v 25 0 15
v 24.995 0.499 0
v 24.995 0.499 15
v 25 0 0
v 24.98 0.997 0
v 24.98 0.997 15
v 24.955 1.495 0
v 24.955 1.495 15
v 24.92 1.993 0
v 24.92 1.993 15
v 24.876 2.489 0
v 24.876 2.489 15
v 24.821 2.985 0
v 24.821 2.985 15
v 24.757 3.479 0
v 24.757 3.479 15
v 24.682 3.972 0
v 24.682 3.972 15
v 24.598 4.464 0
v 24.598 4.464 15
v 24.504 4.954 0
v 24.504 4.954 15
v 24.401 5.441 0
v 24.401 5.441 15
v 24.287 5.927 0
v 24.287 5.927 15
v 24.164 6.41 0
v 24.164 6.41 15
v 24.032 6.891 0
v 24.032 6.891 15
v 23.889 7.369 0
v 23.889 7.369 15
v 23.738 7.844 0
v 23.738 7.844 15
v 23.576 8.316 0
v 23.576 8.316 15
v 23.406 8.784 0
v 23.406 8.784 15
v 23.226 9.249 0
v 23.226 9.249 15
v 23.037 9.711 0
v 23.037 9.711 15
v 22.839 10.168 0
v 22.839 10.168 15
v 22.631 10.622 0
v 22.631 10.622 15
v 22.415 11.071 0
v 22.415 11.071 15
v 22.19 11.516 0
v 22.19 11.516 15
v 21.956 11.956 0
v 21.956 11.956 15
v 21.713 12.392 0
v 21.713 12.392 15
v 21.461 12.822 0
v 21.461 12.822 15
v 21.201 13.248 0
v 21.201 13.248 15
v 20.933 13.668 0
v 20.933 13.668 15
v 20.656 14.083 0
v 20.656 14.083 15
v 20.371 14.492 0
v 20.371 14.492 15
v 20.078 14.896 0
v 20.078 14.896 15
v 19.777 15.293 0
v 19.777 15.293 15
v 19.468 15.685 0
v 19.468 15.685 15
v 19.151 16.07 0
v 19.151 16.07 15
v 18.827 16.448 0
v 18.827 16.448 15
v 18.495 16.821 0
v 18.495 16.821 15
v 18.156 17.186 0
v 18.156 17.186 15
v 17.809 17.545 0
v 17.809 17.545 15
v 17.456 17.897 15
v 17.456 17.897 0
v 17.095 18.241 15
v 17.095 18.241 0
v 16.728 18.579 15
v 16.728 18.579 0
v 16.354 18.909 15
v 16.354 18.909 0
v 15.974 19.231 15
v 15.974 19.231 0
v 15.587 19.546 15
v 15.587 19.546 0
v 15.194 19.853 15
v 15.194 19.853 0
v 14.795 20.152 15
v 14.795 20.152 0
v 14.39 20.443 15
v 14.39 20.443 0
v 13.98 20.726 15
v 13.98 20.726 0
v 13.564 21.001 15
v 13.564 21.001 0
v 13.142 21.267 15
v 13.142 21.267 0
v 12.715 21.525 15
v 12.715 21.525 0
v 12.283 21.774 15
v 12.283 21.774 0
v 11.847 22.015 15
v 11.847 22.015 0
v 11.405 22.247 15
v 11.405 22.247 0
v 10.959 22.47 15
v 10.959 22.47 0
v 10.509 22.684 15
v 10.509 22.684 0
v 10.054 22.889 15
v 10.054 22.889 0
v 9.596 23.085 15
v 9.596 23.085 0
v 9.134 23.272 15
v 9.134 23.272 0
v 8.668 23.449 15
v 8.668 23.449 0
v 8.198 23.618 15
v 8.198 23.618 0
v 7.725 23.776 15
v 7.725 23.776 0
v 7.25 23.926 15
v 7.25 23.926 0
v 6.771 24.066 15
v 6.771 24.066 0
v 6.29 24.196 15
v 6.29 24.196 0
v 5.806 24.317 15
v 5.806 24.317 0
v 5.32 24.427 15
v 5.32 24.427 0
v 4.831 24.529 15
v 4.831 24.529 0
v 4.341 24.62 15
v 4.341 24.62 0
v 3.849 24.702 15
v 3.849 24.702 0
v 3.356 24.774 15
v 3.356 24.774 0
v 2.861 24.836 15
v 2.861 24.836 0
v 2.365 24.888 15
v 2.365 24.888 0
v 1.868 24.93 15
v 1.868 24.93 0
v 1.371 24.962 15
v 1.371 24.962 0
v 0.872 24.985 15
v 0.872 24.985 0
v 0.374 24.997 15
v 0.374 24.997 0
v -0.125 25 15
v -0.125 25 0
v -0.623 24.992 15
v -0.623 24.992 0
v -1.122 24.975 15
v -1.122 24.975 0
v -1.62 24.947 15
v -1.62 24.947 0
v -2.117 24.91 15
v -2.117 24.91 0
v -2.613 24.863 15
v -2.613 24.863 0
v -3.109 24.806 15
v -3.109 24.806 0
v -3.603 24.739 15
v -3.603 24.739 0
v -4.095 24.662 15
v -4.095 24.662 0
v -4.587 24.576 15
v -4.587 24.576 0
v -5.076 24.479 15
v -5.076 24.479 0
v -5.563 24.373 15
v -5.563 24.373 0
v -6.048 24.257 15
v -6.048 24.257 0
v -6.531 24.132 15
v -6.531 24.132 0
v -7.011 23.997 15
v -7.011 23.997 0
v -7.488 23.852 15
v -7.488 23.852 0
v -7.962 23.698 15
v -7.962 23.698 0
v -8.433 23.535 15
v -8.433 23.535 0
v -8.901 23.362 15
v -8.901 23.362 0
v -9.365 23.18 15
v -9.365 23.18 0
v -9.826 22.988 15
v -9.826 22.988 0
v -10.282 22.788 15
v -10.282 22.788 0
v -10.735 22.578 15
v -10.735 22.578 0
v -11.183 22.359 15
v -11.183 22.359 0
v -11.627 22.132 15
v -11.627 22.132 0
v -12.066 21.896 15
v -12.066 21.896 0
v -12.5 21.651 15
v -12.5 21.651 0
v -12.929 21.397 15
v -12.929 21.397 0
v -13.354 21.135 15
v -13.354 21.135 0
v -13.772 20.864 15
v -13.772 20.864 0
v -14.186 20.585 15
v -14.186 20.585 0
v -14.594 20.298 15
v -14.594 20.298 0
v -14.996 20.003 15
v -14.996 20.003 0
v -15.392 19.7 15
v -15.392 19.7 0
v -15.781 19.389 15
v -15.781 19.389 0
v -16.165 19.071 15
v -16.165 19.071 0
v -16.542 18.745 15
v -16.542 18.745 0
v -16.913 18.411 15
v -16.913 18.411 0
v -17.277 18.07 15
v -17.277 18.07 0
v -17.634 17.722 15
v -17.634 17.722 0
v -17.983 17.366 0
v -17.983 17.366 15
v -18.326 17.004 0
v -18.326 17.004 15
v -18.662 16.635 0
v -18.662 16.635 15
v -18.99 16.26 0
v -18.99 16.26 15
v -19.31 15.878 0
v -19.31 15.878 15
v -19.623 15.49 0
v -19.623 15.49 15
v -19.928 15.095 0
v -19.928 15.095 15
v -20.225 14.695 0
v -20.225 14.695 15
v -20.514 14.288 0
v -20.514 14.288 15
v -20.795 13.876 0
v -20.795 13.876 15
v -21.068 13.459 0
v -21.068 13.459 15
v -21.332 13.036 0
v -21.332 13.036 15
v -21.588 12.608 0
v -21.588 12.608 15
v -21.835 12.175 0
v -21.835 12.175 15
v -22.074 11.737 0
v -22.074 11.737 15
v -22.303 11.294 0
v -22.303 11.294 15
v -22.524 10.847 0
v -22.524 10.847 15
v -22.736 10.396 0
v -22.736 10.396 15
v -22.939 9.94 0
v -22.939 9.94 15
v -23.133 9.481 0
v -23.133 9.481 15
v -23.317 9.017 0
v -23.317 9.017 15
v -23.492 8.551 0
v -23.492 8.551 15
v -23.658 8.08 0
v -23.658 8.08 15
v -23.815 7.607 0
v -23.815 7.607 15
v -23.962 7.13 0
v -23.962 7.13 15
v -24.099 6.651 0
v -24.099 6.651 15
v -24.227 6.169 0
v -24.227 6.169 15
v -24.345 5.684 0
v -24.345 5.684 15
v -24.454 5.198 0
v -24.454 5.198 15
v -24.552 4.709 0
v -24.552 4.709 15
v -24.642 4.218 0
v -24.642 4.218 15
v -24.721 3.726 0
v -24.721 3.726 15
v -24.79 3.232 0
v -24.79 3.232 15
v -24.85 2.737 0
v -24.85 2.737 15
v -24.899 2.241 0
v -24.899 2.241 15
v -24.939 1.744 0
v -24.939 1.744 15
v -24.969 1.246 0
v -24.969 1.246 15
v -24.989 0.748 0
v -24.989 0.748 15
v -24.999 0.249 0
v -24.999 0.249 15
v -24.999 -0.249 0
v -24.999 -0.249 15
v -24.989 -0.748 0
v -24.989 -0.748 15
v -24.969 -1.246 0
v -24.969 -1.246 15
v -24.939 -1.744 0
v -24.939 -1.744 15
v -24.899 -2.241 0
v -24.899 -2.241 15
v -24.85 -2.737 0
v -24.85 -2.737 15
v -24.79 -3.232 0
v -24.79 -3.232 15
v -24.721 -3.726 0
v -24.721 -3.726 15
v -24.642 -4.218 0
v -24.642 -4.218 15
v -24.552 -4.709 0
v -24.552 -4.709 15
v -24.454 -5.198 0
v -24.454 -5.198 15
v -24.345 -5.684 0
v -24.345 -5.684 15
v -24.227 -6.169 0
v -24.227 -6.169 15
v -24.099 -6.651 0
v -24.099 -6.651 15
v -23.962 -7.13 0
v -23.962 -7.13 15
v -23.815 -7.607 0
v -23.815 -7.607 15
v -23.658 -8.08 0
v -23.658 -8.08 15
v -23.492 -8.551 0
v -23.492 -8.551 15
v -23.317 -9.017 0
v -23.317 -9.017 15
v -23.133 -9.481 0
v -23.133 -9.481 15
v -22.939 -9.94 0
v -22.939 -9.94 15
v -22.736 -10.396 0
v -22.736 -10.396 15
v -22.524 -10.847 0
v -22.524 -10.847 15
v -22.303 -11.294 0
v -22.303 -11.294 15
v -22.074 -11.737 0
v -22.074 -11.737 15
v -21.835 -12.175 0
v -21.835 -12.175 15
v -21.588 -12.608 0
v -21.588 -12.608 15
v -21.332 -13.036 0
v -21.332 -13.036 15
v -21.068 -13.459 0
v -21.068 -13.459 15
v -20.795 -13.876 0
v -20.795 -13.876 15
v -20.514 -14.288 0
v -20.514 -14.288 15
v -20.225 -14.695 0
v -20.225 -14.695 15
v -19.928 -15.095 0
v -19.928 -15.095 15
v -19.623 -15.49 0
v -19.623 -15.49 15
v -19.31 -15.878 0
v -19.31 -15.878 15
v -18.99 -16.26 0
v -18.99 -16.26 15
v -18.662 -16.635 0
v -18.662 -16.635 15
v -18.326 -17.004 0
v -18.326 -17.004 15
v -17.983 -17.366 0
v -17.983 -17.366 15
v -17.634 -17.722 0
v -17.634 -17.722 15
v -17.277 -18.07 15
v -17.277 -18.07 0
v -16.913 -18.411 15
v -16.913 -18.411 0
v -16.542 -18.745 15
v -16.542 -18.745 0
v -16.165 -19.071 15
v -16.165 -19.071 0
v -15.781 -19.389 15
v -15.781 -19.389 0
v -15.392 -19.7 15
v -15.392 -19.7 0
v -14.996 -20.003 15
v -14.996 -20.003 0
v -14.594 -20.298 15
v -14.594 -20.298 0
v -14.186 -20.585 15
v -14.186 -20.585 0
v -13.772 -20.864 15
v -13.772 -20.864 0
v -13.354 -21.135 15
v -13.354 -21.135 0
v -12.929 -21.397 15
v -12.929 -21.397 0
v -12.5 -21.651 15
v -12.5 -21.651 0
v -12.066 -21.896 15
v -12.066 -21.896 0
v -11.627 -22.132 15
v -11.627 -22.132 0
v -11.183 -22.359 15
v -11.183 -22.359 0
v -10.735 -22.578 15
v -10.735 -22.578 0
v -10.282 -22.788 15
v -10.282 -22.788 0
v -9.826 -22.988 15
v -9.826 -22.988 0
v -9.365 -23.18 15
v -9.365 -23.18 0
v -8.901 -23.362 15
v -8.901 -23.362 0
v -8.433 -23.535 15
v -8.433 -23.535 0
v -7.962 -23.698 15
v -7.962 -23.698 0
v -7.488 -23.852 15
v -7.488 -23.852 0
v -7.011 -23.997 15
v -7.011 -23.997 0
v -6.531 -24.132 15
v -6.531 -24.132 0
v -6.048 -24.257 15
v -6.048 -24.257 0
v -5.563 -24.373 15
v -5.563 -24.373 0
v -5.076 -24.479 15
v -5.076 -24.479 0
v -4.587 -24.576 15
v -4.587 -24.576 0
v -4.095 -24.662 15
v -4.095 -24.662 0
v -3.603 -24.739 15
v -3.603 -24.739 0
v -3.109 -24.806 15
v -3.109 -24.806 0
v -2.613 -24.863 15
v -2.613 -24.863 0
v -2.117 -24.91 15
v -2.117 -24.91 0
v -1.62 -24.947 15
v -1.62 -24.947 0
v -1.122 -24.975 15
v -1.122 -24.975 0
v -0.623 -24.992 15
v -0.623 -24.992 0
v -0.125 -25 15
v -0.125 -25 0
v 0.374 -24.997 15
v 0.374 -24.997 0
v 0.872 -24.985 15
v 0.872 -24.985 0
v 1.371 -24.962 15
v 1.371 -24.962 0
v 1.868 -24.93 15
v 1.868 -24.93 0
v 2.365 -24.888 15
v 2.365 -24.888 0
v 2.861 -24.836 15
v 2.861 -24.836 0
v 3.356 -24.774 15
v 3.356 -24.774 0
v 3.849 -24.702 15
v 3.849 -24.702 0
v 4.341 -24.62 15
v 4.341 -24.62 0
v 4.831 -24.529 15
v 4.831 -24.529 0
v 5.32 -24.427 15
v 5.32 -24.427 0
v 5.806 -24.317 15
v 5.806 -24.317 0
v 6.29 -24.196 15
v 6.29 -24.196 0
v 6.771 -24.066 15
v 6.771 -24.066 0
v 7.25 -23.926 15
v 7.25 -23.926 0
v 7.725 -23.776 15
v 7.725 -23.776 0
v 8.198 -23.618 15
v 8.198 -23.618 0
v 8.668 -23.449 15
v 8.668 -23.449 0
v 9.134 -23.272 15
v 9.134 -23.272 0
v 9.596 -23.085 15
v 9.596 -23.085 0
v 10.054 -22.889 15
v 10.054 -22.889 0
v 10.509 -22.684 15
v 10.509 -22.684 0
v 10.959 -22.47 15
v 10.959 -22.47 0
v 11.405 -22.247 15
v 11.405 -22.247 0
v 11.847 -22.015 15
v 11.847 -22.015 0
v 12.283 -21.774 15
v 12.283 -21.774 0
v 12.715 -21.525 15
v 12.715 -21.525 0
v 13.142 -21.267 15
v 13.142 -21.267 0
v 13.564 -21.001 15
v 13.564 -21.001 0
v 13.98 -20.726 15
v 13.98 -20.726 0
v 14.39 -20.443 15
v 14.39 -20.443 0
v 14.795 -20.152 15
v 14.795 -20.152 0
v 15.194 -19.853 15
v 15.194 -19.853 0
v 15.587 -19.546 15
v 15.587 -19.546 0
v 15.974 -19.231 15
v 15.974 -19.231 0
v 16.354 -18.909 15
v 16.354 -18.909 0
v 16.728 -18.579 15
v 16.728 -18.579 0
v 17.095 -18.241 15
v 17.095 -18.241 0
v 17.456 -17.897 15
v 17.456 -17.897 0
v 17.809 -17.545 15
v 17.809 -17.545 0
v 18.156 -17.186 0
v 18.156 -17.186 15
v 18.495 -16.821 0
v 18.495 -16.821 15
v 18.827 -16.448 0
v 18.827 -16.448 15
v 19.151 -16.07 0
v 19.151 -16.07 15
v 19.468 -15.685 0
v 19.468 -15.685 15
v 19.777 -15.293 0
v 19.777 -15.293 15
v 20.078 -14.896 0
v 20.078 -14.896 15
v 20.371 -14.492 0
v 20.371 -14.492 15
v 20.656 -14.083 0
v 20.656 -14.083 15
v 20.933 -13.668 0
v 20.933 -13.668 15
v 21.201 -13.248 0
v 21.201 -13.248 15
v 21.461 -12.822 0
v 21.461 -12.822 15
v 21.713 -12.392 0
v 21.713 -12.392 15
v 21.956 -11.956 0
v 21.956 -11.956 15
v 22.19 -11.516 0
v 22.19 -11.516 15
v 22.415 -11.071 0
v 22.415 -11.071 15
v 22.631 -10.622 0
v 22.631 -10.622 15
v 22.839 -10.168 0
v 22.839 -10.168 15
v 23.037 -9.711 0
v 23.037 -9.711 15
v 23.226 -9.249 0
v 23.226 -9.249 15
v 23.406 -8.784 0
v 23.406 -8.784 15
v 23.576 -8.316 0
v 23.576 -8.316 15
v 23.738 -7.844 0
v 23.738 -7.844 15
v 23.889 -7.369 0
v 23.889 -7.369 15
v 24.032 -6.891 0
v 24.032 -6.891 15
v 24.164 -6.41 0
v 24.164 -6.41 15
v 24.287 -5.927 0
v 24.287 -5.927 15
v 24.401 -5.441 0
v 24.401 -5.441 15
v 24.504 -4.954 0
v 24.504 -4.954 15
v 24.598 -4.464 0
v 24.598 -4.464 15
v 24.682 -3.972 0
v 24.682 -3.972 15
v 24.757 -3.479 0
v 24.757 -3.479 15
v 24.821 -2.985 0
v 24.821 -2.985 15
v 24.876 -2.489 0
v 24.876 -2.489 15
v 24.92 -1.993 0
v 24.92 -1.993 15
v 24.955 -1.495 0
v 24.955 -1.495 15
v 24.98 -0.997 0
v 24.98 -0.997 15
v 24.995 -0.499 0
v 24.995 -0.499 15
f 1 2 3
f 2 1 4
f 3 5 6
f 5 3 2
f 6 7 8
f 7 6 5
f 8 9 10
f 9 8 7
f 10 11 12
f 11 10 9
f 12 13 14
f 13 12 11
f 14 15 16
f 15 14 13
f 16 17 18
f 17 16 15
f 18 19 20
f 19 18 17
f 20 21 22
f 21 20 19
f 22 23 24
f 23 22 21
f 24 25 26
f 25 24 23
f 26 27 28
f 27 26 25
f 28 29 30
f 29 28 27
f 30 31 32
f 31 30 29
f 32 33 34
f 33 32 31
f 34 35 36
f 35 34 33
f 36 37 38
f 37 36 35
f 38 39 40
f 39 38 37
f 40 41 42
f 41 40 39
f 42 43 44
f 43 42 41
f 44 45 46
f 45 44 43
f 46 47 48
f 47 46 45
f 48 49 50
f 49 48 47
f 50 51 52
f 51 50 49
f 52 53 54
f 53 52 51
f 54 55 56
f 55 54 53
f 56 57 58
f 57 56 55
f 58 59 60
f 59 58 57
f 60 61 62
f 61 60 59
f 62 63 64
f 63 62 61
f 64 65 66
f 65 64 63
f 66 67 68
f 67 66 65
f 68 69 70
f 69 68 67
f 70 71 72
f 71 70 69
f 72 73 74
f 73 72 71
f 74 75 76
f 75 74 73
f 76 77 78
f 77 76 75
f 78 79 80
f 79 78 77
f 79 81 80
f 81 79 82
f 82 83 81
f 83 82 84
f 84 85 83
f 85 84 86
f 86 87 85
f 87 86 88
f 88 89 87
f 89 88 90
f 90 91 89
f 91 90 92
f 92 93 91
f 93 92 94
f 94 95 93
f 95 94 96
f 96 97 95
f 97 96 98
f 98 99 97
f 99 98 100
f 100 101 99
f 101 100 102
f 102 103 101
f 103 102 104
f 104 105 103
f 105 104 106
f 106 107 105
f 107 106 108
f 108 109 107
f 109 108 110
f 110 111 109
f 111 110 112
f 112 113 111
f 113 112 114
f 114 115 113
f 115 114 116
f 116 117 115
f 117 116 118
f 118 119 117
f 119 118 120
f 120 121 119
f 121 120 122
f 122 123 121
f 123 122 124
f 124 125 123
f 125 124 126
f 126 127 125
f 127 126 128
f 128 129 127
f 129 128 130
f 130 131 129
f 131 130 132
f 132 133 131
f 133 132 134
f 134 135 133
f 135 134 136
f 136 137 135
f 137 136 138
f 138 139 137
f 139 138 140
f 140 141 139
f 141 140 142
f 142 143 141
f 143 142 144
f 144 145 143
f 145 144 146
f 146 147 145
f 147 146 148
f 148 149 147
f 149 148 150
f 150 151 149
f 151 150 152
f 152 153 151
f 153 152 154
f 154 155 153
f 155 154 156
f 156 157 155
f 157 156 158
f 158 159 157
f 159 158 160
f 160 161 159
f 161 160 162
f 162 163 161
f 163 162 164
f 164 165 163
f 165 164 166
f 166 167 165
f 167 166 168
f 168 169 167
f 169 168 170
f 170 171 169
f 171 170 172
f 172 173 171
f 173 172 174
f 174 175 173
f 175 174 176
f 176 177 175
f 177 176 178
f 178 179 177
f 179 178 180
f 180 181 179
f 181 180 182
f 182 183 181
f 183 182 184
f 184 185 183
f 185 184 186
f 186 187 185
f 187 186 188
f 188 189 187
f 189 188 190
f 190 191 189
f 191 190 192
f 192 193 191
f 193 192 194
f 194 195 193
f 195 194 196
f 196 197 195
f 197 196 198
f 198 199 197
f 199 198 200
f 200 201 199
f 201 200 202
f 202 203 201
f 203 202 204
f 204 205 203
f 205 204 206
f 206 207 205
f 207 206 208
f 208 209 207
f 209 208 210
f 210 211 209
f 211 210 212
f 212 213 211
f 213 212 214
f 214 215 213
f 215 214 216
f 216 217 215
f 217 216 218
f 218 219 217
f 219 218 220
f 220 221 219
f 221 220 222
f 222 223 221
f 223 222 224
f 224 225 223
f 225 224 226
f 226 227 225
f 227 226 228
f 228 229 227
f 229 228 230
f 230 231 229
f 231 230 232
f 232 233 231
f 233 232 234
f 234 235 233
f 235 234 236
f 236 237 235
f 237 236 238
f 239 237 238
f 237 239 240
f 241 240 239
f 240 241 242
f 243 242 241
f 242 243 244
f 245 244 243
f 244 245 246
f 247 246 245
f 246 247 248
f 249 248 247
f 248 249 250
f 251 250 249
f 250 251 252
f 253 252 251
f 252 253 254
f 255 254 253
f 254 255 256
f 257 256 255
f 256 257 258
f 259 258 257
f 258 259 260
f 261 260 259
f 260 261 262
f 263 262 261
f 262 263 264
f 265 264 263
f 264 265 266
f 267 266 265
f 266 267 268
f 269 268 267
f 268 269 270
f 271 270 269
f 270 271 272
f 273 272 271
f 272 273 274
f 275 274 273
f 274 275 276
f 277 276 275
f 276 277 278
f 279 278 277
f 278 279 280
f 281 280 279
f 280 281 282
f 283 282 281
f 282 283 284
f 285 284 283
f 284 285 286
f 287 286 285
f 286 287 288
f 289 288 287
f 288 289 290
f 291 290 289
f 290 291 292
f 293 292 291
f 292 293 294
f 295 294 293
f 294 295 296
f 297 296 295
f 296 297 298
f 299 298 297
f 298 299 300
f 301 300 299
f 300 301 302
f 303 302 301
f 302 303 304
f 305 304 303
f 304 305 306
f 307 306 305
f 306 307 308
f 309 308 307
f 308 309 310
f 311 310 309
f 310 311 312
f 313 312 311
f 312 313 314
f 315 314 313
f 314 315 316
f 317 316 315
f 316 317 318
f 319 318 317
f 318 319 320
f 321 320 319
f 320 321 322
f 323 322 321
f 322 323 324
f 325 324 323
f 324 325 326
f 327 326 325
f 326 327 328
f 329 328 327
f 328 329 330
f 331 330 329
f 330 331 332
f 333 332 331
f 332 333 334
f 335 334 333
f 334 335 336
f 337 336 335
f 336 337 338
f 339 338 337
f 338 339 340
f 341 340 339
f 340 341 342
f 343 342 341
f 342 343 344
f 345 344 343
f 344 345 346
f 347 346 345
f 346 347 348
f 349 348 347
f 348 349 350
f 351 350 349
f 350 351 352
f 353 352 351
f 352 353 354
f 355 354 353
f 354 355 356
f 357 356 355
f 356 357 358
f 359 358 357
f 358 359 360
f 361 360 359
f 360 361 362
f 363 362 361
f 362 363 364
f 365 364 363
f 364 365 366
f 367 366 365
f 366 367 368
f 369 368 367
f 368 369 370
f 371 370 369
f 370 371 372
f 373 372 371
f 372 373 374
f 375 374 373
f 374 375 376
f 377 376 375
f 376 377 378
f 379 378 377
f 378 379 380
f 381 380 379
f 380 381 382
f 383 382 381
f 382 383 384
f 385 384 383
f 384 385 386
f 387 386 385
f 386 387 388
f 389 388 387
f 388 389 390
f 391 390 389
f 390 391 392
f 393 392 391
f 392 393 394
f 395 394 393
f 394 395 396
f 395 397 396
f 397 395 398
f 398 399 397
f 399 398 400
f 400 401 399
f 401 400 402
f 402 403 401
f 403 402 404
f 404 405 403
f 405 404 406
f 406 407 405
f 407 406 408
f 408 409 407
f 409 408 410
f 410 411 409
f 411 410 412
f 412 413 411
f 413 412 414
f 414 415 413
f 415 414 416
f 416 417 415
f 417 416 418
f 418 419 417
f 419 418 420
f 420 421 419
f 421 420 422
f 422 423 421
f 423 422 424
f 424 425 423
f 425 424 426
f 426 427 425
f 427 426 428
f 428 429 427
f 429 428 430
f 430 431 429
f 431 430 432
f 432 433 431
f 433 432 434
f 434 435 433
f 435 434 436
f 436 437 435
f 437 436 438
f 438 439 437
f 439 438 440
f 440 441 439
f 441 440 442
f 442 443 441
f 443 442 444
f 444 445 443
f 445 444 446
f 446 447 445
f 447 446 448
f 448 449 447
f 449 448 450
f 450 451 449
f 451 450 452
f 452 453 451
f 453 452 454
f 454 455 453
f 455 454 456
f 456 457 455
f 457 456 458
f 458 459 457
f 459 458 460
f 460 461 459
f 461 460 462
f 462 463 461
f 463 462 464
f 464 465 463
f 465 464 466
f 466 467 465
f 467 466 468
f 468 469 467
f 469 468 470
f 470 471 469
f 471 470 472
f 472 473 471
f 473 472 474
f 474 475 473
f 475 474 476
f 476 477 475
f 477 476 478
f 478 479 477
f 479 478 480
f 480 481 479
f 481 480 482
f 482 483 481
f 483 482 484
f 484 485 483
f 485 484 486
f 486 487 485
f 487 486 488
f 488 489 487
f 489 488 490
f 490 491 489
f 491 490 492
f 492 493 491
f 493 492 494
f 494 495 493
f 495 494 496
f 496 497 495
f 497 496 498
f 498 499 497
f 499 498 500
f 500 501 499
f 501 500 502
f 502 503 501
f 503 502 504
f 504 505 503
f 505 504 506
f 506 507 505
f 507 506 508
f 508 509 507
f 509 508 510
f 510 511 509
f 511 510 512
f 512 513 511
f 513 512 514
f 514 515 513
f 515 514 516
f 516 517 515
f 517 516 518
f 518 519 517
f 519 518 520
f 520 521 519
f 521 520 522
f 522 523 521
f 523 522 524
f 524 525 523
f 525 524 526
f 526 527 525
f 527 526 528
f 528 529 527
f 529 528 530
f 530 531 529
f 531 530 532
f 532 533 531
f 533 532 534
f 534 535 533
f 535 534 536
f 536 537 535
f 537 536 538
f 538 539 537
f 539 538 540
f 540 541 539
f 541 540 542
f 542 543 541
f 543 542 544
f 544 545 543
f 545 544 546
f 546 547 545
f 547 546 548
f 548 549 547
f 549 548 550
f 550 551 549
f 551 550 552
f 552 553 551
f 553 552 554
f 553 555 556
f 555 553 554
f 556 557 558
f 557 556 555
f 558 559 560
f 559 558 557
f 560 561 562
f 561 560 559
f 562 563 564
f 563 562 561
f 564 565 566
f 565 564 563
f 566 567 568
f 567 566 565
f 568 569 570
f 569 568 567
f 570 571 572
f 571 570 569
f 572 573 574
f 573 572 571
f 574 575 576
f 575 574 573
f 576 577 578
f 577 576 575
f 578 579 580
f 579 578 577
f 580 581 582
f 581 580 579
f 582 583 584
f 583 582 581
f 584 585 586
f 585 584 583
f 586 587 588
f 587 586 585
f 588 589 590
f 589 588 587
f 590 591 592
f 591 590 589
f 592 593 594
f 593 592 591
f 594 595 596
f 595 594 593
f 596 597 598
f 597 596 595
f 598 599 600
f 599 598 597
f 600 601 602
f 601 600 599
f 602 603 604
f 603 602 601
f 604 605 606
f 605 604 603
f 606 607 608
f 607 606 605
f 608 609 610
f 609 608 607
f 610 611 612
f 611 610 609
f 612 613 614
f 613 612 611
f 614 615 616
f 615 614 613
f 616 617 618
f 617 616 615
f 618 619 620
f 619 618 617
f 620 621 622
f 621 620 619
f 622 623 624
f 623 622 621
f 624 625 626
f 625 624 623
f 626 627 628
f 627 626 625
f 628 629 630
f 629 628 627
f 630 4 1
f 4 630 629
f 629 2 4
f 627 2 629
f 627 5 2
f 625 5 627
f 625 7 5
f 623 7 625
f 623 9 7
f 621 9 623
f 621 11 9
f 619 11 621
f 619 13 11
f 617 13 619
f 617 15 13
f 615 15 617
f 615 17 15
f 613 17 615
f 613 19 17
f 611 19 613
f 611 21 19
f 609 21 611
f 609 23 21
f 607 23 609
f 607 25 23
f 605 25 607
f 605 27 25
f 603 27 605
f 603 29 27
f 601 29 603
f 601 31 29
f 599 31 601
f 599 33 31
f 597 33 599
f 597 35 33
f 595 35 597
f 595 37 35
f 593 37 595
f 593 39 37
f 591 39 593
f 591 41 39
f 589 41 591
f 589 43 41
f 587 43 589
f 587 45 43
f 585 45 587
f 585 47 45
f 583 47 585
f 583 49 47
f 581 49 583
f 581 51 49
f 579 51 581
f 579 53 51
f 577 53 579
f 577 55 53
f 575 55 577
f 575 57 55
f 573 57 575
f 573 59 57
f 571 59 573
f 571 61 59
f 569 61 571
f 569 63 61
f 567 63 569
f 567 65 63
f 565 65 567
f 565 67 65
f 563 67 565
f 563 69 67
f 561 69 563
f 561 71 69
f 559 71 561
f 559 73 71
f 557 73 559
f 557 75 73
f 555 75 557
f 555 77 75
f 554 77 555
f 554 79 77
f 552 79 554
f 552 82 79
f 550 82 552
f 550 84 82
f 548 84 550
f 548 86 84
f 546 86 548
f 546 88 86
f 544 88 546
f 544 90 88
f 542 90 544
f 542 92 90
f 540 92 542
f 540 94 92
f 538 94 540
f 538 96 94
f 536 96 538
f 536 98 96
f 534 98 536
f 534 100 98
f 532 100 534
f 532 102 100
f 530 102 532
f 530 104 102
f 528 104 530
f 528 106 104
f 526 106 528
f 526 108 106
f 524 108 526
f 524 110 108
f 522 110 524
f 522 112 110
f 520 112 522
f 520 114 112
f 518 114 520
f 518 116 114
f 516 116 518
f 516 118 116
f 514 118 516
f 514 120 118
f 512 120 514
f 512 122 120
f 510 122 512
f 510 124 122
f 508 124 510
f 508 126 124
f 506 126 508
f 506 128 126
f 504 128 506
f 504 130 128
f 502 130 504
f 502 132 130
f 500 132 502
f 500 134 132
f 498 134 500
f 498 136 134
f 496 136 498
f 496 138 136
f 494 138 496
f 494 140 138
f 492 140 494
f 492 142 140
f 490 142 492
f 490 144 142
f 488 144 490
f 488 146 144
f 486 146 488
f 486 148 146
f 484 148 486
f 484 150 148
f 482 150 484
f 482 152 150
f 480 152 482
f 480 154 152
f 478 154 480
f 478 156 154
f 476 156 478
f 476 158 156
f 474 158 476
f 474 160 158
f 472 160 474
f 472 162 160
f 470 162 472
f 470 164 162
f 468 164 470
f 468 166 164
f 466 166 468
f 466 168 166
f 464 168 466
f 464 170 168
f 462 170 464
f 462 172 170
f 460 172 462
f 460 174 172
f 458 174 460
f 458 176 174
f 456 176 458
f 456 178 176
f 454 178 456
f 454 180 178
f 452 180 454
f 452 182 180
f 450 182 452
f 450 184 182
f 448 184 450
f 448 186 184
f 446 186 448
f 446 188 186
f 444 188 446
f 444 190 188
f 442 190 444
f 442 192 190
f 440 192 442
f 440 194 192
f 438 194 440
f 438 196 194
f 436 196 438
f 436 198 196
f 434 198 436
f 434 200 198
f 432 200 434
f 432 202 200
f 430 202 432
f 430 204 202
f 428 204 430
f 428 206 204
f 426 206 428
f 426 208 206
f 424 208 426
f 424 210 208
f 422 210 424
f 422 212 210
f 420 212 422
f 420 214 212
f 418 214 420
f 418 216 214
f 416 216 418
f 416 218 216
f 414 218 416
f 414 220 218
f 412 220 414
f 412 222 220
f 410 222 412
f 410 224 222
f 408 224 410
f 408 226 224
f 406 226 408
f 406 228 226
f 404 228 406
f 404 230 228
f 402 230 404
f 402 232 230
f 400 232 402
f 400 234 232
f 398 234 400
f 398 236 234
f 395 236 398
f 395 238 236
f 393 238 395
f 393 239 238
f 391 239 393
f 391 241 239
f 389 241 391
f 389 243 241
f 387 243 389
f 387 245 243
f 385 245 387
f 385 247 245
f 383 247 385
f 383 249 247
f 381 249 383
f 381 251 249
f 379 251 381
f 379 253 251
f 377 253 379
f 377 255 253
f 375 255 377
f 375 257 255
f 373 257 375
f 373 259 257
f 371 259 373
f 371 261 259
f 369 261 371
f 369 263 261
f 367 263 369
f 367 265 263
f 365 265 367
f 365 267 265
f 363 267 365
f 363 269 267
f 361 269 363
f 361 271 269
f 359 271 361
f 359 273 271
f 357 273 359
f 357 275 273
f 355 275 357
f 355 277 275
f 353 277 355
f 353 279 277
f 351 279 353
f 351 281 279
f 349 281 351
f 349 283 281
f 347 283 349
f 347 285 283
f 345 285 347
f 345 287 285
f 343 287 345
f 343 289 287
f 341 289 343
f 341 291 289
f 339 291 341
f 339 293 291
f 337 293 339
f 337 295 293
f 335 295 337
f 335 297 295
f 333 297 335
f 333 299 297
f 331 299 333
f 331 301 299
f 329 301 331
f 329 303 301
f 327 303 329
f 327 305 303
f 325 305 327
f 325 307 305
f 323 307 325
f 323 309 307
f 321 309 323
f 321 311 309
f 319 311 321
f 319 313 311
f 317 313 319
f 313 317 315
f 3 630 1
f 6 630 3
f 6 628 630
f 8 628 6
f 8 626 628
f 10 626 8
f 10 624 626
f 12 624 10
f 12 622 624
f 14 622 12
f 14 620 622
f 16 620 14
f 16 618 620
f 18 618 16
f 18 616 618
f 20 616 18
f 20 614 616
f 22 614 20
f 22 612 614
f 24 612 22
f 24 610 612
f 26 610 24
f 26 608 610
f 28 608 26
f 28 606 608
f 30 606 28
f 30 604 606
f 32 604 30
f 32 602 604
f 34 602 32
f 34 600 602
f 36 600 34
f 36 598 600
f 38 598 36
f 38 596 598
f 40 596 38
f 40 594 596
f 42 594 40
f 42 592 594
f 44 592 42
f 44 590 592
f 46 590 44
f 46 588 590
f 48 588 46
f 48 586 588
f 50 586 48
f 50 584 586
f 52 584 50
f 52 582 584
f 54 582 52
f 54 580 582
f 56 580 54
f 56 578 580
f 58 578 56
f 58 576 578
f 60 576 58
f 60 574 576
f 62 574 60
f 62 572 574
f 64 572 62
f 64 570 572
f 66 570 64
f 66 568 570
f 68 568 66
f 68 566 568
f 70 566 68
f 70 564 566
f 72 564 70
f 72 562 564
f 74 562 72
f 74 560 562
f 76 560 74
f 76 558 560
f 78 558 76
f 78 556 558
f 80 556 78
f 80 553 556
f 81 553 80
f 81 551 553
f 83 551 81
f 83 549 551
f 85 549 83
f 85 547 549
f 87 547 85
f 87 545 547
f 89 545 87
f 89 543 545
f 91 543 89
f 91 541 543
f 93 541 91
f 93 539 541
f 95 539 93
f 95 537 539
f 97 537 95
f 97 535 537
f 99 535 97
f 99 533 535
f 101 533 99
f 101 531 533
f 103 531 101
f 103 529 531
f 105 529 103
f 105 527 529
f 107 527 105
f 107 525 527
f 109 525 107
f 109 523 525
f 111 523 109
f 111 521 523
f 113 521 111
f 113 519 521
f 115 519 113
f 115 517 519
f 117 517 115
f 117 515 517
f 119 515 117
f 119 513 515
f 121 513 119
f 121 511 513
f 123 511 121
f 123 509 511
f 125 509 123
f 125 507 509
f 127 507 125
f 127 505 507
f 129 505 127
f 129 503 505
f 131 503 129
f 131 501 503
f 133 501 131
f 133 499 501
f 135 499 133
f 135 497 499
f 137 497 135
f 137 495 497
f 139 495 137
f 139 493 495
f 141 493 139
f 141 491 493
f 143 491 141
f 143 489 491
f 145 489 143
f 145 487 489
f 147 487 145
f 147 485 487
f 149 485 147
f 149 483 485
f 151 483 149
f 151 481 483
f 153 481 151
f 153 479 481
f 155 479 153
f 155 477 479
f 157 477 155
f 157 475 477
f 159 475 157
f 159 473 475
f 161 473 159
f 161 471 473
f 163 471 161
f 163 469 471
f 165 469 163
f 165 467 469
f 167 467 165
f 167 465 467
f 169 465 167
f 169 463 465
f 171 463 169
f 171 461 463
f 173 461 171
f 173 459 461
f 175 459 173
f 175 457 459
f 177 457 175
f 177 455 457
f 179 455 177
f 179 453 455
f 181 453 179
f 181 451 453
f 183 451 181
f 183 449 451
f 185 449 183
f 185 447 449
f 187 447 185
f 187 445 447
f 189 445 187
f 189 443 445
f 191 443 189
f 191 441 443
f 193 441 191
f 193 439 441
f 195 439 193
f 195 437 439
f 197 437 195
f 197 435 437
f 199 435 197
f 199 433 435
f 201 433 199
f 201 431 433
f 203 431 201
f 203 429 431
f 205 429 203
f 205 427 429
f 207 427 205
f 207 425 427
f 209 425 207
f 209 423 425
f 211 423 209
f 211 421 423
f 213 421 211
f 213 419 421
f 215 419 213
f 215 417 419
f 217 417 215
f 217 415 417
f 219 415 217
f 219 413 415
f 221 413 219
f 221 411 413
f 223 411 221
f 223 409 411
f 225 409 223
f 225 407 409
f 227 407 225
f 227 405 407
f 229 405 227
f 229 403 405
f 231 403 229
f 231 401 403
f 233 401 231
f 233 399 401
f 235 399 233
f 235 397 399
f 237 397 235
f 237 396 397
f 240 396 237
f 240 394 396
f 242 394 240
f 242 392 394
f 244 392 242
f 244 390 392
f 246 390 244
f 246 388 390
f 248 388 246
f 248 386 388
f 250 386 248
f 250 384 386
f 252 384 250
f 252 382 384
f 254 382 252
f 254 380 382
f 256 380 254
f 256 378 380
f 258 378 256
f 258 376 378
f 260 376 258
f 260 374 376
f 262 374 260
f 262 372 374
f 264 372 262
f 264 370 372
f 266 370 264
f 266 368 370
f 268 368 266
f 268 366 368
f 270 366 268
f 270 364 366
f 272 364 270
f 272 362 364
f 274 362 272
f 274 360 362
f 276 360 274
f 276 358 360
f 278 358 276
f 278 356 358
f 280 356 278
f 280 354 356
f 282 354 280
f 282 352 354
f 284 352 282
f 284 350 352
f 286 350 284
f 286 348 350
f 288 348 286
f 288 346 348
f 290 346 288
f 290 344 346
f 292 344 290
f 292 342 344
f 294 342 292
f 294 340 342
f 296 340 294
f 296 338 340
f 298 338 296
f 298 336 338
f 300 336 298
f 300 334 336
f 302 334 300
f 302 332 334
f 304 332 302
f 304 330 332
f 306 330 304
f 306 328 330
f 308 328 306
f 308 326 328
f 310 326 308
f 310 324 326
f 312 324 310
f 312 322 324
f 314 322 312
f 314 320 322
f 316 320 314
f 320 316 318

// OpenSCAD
include <FullAssembly.scad>
/* [Hidden] */
isStandalone=false;
$fa=1;

// Rocker-Base
cylinder(d=50,h=15);
